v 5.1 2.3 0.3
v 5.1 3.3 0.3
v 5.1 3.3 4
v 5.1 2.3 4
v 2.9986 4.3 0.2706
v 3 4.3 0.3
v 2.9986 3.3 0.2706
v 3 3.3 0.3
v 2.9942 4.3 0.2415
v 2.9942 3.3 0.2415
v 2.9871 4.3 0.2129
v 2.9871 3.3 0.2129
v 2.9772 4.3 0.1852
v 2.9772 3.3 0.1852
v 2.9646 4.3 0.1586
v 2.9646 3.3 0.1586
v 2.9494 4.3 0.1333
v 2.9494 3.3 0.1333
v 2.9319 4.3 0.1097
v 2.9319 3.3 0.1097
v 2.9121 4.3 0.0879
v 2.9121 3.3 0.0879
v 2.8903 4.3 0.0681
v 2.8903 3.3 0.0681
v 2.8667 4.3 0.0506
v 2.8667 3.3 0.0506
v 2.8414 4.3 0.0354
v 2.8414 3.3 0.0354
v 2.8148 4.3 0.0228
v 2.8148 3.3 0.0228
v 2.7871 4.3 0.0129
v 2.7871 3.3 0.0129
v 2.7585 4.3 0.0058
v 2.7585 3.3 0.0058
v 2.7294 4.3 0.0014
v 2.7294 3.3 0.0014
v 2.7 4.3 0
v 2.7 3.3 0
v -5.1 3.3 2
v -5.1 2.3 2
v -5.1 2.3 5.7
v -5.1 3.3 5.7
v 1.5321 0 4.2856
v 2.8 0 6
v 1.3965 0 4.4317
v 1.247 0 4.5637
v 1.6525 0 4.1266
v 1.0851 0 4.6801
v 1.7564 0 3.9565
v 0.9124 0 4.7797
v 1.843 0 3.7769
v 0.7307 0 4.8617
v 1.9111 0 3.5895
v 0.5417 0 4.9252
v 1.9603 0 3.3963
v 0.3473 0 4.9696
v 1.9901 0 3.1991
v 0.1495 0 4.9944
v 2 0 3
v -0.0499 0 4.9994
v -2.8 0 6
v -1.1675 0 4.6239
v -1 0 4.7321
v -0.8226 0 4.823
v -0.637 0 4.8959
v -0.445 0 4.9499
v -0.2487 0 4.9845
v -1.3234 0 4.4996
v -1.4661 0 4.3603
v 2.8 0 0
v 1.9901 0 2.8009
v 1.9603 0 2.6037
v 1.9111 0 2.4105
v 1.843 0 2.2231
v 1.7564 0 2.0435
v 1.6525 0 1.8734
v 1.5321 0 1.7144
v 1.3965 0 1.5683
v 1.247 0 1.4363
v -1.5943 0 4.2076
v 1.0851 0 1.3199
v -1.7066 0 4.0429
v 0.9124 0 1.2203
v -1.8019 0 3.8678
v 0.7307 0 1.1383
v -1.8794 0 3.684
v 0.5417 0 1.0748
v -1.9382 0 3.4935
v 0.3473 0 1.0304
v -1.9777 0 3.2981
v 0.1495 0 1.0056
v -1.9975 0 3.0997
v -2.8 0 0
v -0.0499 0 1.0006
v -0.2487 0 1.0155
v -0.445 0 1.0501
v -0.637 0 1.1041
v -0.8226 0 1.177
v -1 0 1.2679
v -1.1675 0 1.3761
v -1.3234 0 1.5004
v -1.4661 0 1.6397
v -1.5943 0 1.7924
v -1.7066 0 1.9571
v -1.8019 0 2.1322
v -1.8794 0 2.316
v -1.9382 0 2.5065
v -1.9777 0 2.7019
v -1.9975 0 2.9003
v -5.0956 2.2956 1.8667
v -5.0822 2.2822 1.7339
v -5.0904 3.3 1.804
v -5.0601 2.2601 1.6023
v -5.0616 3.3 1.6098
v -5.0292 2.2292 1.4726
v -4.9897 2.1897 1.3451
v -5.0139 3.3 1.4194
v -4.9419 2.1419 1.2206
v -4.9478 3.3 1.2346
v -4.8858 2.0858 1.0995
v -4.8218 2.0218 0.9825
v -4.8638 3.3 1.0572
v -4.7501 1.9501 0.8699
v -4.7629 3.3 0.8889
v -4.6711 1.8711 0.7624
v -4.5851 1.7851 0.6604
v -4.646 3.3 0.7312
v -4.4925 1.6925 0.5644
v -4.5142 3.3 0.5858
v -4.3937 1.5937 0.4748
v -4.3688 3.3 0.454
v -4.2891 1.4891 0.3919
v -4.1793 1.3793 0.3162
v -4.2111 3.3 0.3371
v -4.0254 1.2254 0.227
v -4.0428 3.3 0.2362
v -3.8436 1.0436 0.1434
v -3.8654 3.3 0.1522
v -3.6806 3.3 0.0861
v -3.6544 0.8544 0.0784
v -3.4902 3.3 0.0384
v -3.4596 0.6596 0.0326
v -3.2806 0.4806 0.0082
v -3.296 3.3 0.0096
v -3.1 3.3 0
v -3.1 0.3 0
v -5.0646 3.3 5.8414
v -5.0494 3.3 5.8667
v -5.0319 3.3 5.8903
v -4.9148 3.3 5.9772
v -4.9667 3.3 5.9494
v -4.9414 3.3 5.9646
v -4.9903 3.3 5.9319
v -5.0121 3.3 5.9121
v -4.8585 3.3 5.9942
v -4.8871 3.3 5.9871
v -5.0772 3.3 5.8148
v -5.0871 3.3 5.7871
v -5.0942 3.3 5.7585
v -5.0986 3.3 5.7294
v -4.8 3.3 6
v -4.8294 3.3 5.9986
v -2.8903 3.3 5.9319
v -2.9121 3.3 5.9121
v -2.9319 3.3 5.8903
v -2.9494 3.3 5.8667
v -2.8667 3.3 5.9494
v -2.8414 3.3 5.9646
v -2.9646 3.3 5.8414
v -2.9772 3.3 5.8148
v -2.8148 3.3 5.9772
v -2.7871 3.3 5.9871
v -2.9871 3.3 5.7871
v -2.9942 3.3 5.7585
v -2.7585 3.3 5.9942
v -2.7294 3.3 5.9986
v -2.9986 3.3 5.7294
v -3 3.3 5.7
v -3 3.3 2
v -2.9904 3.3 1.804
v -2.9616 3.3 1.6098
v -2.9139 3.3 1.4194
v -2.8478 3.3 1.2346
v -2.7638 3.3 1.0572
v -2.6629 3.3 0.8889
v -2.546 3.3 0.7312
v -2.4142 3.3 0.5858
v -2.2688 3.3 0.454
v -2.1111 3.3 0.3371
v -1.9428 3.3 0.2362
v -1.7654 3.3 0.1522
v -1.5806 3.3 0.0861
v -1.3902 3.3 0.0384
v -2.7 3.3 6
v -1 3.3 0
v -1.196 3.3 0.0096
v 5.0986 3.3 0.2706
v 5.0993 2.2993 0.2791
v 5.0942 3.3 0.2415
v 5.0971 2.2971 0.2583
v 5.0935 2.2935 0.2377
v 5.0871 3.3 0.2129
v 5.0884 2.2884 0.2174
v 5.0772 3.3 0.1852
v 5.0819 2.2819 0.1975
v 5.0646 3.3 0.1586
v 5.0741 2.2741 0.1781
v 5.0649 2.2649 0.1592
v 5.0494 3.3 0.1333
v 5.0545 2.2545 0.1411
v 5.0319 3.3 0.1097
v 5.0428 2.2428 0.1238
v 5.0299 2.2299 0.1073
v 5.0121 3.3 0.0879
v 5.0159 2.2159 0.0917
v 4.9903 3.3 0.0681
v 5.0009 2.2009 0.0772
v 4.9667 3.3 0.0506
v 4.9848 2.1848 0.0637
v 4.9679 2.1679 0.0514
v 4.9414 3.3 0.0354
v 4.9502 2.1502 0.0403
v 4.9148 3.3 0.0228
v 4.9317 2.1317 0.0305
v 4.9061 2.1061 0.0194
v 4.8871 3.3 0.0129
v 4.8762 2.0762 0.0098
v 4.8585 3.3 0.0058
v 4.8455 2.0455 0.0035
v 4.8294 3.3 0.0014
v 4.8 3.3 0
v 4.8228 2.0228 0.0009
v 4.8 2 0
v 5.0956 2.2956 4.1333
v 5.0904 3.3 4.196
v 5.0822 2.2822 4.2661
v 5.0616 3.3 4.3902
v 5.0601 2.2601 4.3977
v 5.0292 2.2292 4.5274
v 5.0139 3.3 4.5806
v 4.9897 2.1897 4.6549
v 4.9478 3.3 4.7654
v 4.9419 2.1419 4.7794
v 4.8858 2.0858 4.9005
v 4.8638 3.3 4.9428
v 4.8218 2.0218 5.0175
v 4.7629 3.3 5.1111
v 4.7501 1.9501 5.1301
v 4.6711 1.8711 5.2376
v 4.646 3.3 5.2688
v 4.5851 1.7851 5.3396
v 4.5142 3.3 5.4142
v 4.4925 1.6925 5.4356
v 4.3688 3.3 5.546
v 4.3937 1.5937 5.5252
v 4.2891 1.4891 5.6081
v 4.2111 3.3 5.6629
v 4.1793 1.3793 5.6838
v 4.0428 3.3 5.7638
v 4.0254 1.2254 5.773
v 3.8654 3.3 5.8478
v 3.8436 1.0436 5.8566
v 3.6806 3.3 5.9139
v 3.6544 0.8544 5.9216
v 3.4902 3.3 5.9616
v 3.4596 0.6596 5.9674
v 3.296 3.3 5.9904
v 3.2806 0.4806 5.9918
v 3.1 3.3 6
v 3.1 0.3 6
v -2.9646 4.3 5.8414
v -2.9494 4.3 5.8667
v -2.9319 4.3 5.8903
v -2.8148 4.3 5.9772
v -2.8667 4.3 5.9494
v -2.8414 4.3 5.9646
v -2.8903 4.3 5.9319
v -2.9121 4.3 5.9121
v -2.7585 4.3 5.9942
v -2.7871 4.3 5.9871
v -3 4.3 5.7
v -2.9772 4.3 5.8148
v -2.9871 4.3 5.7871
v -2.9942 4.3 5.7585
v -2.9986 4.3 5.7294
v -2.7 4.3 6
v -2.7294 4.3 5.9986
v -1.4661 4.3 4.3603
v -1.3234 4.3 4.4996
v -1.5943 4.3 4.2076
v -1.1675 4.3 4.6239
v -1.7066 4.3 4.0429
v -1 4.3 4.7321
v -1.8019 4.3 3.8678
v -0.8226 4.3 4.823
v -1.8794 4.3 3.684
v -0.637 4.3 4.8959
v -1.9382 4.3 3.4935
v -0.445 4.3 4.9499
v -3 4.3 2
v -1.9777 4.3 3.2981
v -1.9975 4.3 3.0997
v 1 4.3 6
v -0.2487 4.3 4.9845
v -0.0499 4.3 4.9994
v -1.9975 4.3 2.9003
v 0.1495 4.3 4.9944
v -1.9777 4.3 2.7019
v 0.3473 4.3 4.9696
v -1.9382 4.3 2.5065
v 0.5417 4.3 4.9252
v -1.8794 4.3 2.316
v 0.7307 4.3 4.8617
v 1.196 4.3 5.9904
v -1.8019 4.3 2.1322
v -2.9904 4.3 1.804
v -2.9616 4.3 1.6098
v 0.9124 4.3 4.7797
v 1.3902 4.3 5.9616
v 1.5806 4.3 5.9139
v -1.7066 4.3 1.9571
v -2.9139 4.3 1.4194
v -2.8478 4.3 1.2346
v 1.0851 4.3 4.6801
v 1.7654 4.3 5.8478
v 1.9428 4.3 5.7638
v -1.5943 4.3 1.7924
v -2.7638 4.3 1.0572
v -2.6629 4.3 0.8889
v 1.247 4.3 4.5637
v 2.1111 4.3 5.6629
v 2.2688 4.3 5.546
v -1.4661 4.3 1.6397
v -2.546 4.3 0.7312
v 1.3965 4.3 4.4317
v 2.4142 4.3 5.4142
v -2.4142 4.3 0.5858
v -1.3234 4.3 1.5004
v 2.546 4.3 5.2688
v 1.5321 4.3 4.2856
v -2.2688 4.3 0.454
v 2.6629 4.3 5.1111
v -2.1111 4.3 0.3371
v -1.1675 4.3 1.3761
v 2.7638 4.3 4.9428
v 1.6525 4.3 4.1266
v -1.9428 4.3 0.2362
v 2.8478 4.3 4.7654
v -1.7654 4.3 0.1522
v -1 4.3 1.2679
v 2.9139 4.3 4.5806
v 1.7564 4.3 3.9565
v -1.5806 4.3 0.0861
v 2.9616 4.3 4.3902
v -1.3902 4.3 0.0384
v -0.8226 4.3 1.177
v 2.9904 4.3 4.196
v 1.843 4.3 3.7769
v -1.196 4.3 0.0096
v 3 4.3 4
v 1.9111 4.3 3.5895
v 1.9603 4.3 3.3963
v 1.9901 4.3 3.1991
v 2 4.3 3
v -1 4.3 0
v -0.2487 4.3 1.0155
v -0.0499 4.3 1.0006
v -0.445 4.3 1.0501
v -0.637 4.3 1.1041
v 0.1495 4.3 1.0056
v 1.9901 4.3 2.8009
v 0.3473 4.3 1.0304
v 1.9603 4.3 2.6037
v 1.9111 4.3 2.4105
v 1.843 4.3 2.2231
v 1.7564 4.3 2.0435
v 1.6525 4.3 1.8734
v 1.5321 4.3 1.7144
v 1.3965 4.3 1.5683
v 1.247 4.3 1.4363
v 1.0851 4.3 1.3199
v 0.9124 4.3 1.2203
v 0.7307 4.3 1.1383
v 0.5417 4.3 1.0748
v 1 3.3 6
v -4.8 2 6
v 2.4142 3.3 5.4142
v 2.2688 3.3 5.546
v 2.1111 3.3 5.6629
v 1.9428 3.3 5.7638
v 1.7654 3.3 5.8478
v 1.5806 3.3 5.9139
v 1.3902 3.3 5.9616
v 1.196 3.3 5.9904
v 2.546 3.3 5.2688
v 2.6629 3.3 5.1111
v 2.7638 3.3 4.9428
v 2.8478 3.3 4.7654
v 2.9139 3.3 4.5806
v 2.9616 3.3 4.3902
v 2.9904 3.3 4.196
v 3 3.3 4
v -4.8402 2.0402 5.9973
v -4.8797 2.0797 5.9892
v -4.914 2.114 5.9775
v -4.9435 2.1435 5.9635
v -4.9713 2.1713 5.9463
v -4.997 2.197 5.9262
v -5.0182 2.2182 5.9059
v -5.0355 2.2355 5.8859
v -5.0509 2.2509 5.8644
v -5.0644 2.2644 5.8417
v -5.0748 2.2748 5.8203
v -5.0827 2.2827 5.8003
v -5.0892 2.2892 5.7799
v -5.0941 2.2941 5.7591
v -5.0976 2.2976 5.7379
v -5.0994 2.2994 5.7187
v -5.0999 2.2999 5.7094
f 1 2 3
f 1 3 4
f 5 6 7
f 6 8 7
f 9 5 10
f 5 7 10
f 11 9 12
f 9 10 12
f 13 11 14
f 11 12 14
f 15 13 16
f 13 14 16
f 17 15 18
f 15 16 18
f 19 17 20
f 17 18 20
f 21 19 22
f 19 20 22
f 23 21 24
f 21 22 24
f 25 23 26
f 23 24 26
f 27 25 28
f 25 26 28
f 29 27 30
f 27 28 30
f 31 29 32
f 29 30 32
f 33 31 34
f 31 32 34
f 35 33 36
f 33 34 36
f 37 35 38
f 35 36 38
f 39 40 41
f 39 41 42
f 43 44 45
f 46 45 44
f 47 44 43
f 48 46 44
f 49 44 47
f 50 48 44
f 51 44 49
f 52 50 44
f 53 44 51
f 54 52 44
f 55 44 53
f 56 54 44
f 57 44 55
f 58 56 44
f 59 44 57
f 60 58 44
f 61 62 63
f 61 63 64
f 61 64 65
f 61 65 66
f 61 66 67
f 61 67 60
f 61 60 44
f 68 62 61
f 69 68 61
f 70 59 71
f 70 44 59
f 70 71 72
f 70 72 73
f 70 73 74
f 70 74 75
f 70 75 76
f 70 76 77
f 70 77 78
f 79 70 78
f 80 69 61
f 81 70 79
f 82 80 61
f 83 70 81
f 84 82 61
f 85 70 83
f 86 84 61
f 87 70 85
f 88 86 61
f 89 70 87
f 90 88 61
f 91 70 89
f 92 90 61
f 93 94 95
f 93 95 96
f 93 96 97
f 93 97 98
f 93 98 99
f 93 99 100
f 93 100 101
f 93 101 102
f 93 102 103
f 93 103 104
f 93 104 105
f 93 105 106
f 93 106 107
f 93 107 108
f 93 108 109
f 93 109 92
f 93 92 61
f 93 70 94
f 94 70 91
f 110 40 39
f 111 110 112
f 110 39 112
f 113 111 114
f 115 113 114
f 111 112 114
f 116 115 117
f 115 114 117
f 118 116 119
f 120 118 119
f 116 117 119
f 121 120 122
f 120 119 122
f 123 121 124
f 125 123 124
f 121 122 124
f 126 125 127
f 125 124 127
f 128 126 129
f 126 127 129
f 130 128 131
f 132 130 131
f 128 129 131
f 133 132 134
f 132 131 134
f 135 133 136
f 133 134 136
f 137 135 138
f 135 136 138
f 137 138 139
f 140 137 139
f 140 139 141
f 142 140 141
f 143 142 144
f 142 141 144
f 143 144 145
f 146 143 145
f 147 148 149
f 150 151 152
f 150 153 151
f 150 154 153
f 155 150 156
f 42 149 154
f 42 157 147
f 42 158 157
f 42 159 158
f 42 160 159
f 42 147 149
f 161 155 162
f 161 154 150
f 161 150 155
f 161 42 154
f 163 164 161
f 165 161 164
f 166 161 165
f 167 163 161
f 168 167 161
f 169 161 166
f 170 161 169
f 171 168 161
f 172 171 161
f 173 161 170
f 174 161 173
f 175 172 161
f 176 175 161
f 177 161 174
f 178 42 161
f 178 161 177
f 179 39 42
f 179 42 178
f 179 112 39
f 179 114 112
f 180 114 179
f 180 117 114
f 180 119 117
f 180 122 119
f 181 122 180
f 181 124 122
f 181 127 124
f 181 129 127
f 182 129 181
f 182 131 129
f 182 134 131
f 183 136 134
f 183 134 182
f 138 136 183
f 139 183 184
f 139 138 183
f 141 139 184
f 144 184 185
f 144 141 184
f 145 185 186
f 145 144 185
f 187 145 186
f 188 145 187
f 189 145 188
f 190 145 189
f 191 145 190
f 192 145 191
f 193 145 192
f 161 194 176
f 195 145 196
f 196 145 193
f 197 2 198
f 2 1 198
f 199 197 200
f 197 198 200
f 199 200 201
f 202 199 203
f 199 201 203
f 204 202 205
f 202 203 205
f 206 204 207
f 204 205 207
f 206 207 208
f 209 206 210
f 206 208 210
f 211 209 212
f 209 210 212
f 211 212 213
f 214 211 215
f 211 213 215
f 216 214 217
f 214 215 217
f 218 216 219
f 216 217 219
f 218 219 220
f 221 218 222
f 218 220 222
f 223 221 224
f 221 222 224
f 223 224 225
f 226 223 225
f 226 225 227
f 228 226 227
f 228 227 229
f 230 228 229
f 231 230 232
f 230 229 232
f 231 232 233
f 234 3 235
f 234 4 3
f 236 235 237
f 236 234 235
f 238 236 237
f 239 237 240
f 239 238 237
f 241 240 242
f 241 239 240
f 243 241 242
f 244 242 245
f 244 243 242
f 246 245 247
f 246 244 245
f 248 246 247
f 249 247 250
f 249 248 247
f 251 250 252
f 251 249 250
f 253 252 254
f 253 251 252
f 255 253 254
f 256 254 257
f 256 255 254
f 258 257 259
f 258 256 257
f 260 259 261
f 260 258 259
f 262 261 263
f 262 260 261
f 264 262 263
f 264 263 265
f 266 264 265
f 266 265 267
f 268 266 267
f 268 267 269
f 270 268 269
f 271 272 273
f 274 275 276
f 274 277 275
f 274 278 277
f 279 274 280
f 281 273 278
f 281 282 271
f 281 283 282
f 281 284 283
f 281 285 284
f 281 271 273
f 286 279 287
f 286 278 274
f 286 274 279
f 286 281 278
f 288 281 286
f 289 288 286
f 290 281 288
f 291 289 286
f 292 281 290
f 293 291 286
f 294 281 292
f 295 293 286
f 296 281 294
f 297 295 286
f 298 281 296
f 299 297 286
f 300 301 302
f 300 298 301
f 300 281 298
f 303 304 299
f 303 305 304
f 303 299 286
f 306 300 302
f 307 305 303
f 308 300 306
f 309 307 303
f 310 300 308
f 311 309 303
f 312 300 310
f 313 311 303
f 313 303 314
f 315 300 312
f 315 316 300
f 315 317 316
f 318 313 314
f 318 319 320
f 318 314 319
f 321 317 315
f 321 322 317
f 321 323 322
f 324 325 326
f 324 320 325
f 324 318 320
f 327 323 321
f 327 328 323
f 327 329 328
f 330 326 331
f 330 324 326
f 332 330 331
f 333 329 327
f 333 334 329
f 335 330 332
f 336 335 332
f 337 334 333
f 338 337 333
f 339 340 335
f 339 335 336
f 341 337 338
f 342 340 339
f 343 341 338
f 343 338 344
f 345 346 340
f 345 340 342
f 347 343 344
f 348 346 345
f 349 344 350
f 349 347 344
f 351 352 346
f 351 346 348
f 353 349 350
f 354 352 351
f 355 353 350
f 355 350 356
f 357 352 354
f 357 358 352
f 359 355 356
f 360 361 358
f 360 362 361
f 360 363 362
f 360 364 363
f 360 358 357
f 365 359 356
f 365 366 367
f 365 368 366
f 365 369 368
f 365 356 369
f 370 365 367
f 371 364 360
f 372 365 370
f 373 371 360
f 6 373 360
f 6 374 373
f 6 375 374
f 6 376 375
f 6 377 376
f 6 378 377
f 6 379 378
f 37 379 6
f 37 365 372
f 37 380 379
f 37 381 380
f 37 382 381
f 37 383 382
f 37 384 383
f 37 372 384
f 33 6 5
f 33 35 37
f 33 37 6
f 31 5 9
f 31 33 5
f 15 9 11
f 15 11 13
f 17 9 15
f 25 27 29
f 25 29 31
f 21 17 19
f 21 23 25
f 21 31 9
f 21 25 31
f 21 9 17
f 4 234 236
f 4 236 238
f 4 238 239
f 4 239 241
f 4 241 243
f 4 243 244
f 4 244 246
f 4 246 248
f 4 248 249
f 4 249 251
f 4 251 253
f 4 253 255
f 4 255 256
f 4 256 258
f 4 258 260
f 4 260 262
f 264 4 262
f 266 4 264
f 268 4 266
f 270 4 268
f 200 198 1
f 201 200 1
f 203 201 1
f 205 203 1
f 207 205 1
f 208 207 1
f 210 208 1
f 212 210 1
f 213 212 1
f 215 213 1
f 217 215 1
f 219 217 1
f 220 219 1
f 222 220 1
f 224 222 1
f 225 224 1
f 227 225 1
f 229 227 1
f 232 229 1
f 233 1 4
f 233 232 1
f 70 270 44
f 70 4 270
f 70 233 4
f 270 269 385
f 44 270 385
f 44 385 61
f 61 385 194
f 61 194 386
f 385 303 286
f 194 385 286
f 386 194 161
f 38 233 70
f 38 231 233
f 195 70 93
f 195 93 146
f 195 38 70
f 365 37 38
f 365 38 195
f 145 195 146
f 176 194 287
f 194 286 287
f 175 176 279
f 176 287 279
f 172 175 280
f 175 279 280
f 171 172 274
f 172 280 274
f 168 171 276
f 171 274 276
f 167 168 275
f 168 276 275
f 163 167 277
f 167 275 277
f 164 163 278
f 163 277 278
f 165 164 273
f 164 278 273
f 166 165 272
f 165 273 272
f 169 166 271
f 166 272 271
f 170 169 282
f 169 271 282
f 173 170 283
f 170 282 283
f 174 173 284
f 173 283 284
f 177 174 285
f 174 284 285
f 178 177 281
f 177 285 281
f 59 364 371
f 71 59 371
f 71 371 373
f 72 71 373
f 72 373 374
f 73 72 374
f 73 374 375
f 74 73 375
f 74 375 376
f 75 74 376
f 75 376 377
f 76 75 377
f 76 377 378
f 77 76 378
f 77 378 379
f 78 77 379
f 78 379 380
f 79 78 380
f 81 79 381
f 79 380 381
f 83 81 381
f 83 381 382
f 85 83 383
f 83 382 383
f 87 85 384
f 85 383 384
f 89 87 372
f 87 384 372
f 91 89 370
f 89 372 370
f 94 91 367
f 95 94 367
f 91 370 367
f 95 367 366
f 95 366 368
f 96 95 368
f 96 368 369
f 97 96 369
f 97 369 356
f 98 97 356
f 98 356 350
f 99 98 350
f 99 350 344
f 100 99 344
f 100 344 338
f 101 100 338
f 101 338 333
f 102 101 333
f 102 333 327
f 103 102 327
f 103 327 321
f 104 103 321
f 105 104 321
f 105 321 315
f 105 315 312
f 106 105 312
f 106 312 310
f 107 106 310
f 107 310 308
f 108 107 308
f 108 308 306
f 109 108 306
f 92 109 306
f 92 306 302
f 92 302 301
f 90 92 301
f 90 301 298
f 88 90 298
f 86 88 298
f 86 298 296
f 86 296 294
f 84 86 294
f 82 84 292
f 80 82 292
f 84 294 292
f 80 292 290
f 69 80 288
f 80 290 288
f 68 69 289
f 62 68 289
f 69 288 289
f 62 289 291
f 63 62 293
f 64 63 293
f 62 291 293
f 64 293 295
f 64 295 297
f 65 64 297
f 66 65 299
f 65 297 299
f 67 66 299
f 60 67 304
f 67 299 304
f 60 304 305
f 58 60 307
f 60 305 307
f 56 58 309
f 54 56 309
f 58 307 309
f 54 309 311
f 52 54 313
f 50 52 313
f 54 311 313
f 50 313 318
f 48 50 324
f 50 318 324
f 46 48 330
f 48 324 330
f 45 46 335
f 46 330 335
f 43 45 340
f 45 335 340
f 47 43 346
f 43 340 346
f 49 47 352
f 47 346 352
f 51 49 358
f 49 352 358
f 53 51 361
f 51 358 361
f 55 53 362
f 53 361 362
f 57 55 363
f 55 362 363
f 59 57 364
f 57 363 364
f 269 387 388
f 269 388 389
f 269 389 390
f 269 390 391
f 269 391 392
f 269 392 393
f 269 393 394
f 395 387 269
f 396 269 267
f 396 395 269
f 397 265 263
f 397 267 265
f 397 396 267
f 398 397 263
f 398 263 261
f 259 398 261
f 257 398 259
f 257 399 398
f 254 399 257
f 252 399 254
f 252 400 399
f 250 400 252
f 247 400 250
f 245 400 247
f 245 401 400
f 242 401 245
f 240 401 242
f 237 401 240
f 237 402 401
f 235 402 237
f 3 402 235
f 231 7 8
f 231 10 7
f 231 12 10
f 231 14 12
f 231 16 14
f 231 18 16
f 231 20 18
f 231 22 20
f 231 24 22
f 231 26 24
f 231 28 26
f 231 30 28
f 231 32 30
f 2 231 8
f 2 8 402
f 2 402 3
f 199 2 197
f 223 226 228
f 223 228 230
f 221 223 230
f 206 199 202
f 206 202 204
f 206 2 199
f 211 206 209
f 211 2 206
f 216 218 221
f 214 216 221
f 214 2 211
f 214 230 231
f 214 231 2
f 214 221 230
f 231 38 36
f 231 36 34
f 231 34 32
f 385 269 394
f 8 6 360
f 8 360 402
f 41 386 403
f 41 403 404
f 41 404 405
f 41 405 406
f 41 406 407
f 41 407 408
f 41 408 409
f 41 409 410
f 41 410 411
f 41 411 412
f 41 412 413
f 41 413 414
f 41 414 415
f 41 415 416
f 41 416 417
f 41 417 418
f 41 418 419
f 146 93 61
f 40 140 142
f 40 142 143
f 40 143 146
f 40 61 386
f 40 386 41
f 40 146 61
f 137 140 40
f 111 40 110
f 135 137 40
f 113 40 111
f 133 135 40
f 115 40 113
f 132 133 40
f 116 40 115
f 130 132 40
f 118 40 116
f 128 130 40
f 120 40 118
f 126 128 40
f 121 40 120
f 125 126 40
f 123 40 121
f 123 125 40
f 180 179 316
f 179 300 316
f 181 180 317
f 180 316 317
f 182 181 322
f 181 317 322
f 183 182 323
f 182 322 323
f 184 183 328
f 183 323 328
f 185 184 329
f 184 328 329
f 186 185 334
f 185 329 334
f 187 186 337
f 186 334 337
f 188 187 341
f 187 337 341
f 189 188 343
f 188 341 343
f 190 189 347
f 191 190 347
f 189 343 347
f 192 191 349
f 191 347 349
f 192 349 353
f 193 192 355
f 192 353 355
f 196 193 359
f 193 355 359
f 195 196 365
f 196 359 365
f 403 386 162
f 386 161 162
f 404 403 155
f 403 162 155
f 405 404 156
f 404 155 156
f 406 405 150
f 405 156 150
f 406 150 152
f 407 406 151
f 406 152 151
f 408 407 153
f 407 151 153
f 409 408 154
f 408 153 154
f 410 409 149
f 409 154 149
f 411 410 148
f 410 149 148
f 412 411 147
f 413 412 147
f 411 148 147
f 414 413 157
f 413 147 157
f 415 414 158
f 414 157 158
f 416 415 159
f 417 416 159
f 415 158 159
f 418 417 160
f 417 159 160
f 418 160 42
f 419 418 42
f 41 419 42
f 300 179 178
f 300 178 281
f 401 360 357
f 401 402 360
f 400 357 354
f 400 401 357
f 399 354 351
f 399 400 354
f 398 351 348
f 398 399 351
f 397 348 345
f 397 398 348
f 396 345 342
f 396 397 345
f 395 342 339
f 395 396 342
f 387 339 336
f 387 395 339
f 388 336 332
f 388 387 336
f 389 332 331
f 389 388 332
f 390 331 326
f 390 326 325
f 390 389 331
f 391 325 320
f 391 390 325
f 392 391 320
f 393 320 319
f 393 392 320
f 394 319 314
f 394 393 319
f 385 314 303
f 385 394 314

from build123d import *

# Parameters (mm, degrees)
EXTRUDE_1_DEPTH     = 6
FILLET_1_R          = 2
FILLET_2_R          = 2
FILLET_3_R          = 0.3
SKETCH_2_R          = 2
CUT_EXTRUDE_1_DEPTH = 6


with BuildPart() as part:
    # 草图1 → 凸台-拉伸1 (new body)
    with BuildSketch(Plane.XY):
        Polygon((-3, 4.3), (3, 4.3), (3, 3.3), (5.1, 3.3), (5.1, 2.3), (2.8, 0), (-2.8, 0), (-5.1, 2.3), (-5.1, 3.3), (-3, 3.3), align=None)
    extrude(amount=EXTRUDE_1_DEPTH)

    # 圆角1
    fillet_1_edges = [part.edges().sort_by_distance(p)[0] for p in [
        (-3, 3.8, 0),
        (3, 3.8, 6),
    ]]
    fillet(fillet_1_edges, radius=FILLET_1_R)

    # 圆角2
    fillet_2_edges = [part.edges().sort_by_distance(p)[0] for p in [
        (-5.1, 2.8, 0),
        (5.1, 2.8, 6),
    ]]
    fillet(fillet_2_edges, radius=FILLET_2_R)

    # 圆角3
    fillet_3_edges = [part.edges().sort_by_distance(p)[0] for p in [
        (-3, 3.8, 6),
        (3, 3.8, 0),
        (-5.1, 2.8, 6),
        (5.1, 2.8, 0),
    ]]
    fillet(fillet_3_edges, radius=FILLET_3_R)

    # 草图2 → 切除-拉伸1 (cut)
    with BuildSketch(Plane(origin=(0, 4.3, 0), x_dir=(1, 0, 0), z_dir=(0, 1, 0))):
        with Locations((0, -3)):
            Circle(SKETCH_2_R)
    extrude(amount=-CUT_EXTRUDE_1_DEPTH, mode=Mode.SUBTRACT)


solid = part.part
